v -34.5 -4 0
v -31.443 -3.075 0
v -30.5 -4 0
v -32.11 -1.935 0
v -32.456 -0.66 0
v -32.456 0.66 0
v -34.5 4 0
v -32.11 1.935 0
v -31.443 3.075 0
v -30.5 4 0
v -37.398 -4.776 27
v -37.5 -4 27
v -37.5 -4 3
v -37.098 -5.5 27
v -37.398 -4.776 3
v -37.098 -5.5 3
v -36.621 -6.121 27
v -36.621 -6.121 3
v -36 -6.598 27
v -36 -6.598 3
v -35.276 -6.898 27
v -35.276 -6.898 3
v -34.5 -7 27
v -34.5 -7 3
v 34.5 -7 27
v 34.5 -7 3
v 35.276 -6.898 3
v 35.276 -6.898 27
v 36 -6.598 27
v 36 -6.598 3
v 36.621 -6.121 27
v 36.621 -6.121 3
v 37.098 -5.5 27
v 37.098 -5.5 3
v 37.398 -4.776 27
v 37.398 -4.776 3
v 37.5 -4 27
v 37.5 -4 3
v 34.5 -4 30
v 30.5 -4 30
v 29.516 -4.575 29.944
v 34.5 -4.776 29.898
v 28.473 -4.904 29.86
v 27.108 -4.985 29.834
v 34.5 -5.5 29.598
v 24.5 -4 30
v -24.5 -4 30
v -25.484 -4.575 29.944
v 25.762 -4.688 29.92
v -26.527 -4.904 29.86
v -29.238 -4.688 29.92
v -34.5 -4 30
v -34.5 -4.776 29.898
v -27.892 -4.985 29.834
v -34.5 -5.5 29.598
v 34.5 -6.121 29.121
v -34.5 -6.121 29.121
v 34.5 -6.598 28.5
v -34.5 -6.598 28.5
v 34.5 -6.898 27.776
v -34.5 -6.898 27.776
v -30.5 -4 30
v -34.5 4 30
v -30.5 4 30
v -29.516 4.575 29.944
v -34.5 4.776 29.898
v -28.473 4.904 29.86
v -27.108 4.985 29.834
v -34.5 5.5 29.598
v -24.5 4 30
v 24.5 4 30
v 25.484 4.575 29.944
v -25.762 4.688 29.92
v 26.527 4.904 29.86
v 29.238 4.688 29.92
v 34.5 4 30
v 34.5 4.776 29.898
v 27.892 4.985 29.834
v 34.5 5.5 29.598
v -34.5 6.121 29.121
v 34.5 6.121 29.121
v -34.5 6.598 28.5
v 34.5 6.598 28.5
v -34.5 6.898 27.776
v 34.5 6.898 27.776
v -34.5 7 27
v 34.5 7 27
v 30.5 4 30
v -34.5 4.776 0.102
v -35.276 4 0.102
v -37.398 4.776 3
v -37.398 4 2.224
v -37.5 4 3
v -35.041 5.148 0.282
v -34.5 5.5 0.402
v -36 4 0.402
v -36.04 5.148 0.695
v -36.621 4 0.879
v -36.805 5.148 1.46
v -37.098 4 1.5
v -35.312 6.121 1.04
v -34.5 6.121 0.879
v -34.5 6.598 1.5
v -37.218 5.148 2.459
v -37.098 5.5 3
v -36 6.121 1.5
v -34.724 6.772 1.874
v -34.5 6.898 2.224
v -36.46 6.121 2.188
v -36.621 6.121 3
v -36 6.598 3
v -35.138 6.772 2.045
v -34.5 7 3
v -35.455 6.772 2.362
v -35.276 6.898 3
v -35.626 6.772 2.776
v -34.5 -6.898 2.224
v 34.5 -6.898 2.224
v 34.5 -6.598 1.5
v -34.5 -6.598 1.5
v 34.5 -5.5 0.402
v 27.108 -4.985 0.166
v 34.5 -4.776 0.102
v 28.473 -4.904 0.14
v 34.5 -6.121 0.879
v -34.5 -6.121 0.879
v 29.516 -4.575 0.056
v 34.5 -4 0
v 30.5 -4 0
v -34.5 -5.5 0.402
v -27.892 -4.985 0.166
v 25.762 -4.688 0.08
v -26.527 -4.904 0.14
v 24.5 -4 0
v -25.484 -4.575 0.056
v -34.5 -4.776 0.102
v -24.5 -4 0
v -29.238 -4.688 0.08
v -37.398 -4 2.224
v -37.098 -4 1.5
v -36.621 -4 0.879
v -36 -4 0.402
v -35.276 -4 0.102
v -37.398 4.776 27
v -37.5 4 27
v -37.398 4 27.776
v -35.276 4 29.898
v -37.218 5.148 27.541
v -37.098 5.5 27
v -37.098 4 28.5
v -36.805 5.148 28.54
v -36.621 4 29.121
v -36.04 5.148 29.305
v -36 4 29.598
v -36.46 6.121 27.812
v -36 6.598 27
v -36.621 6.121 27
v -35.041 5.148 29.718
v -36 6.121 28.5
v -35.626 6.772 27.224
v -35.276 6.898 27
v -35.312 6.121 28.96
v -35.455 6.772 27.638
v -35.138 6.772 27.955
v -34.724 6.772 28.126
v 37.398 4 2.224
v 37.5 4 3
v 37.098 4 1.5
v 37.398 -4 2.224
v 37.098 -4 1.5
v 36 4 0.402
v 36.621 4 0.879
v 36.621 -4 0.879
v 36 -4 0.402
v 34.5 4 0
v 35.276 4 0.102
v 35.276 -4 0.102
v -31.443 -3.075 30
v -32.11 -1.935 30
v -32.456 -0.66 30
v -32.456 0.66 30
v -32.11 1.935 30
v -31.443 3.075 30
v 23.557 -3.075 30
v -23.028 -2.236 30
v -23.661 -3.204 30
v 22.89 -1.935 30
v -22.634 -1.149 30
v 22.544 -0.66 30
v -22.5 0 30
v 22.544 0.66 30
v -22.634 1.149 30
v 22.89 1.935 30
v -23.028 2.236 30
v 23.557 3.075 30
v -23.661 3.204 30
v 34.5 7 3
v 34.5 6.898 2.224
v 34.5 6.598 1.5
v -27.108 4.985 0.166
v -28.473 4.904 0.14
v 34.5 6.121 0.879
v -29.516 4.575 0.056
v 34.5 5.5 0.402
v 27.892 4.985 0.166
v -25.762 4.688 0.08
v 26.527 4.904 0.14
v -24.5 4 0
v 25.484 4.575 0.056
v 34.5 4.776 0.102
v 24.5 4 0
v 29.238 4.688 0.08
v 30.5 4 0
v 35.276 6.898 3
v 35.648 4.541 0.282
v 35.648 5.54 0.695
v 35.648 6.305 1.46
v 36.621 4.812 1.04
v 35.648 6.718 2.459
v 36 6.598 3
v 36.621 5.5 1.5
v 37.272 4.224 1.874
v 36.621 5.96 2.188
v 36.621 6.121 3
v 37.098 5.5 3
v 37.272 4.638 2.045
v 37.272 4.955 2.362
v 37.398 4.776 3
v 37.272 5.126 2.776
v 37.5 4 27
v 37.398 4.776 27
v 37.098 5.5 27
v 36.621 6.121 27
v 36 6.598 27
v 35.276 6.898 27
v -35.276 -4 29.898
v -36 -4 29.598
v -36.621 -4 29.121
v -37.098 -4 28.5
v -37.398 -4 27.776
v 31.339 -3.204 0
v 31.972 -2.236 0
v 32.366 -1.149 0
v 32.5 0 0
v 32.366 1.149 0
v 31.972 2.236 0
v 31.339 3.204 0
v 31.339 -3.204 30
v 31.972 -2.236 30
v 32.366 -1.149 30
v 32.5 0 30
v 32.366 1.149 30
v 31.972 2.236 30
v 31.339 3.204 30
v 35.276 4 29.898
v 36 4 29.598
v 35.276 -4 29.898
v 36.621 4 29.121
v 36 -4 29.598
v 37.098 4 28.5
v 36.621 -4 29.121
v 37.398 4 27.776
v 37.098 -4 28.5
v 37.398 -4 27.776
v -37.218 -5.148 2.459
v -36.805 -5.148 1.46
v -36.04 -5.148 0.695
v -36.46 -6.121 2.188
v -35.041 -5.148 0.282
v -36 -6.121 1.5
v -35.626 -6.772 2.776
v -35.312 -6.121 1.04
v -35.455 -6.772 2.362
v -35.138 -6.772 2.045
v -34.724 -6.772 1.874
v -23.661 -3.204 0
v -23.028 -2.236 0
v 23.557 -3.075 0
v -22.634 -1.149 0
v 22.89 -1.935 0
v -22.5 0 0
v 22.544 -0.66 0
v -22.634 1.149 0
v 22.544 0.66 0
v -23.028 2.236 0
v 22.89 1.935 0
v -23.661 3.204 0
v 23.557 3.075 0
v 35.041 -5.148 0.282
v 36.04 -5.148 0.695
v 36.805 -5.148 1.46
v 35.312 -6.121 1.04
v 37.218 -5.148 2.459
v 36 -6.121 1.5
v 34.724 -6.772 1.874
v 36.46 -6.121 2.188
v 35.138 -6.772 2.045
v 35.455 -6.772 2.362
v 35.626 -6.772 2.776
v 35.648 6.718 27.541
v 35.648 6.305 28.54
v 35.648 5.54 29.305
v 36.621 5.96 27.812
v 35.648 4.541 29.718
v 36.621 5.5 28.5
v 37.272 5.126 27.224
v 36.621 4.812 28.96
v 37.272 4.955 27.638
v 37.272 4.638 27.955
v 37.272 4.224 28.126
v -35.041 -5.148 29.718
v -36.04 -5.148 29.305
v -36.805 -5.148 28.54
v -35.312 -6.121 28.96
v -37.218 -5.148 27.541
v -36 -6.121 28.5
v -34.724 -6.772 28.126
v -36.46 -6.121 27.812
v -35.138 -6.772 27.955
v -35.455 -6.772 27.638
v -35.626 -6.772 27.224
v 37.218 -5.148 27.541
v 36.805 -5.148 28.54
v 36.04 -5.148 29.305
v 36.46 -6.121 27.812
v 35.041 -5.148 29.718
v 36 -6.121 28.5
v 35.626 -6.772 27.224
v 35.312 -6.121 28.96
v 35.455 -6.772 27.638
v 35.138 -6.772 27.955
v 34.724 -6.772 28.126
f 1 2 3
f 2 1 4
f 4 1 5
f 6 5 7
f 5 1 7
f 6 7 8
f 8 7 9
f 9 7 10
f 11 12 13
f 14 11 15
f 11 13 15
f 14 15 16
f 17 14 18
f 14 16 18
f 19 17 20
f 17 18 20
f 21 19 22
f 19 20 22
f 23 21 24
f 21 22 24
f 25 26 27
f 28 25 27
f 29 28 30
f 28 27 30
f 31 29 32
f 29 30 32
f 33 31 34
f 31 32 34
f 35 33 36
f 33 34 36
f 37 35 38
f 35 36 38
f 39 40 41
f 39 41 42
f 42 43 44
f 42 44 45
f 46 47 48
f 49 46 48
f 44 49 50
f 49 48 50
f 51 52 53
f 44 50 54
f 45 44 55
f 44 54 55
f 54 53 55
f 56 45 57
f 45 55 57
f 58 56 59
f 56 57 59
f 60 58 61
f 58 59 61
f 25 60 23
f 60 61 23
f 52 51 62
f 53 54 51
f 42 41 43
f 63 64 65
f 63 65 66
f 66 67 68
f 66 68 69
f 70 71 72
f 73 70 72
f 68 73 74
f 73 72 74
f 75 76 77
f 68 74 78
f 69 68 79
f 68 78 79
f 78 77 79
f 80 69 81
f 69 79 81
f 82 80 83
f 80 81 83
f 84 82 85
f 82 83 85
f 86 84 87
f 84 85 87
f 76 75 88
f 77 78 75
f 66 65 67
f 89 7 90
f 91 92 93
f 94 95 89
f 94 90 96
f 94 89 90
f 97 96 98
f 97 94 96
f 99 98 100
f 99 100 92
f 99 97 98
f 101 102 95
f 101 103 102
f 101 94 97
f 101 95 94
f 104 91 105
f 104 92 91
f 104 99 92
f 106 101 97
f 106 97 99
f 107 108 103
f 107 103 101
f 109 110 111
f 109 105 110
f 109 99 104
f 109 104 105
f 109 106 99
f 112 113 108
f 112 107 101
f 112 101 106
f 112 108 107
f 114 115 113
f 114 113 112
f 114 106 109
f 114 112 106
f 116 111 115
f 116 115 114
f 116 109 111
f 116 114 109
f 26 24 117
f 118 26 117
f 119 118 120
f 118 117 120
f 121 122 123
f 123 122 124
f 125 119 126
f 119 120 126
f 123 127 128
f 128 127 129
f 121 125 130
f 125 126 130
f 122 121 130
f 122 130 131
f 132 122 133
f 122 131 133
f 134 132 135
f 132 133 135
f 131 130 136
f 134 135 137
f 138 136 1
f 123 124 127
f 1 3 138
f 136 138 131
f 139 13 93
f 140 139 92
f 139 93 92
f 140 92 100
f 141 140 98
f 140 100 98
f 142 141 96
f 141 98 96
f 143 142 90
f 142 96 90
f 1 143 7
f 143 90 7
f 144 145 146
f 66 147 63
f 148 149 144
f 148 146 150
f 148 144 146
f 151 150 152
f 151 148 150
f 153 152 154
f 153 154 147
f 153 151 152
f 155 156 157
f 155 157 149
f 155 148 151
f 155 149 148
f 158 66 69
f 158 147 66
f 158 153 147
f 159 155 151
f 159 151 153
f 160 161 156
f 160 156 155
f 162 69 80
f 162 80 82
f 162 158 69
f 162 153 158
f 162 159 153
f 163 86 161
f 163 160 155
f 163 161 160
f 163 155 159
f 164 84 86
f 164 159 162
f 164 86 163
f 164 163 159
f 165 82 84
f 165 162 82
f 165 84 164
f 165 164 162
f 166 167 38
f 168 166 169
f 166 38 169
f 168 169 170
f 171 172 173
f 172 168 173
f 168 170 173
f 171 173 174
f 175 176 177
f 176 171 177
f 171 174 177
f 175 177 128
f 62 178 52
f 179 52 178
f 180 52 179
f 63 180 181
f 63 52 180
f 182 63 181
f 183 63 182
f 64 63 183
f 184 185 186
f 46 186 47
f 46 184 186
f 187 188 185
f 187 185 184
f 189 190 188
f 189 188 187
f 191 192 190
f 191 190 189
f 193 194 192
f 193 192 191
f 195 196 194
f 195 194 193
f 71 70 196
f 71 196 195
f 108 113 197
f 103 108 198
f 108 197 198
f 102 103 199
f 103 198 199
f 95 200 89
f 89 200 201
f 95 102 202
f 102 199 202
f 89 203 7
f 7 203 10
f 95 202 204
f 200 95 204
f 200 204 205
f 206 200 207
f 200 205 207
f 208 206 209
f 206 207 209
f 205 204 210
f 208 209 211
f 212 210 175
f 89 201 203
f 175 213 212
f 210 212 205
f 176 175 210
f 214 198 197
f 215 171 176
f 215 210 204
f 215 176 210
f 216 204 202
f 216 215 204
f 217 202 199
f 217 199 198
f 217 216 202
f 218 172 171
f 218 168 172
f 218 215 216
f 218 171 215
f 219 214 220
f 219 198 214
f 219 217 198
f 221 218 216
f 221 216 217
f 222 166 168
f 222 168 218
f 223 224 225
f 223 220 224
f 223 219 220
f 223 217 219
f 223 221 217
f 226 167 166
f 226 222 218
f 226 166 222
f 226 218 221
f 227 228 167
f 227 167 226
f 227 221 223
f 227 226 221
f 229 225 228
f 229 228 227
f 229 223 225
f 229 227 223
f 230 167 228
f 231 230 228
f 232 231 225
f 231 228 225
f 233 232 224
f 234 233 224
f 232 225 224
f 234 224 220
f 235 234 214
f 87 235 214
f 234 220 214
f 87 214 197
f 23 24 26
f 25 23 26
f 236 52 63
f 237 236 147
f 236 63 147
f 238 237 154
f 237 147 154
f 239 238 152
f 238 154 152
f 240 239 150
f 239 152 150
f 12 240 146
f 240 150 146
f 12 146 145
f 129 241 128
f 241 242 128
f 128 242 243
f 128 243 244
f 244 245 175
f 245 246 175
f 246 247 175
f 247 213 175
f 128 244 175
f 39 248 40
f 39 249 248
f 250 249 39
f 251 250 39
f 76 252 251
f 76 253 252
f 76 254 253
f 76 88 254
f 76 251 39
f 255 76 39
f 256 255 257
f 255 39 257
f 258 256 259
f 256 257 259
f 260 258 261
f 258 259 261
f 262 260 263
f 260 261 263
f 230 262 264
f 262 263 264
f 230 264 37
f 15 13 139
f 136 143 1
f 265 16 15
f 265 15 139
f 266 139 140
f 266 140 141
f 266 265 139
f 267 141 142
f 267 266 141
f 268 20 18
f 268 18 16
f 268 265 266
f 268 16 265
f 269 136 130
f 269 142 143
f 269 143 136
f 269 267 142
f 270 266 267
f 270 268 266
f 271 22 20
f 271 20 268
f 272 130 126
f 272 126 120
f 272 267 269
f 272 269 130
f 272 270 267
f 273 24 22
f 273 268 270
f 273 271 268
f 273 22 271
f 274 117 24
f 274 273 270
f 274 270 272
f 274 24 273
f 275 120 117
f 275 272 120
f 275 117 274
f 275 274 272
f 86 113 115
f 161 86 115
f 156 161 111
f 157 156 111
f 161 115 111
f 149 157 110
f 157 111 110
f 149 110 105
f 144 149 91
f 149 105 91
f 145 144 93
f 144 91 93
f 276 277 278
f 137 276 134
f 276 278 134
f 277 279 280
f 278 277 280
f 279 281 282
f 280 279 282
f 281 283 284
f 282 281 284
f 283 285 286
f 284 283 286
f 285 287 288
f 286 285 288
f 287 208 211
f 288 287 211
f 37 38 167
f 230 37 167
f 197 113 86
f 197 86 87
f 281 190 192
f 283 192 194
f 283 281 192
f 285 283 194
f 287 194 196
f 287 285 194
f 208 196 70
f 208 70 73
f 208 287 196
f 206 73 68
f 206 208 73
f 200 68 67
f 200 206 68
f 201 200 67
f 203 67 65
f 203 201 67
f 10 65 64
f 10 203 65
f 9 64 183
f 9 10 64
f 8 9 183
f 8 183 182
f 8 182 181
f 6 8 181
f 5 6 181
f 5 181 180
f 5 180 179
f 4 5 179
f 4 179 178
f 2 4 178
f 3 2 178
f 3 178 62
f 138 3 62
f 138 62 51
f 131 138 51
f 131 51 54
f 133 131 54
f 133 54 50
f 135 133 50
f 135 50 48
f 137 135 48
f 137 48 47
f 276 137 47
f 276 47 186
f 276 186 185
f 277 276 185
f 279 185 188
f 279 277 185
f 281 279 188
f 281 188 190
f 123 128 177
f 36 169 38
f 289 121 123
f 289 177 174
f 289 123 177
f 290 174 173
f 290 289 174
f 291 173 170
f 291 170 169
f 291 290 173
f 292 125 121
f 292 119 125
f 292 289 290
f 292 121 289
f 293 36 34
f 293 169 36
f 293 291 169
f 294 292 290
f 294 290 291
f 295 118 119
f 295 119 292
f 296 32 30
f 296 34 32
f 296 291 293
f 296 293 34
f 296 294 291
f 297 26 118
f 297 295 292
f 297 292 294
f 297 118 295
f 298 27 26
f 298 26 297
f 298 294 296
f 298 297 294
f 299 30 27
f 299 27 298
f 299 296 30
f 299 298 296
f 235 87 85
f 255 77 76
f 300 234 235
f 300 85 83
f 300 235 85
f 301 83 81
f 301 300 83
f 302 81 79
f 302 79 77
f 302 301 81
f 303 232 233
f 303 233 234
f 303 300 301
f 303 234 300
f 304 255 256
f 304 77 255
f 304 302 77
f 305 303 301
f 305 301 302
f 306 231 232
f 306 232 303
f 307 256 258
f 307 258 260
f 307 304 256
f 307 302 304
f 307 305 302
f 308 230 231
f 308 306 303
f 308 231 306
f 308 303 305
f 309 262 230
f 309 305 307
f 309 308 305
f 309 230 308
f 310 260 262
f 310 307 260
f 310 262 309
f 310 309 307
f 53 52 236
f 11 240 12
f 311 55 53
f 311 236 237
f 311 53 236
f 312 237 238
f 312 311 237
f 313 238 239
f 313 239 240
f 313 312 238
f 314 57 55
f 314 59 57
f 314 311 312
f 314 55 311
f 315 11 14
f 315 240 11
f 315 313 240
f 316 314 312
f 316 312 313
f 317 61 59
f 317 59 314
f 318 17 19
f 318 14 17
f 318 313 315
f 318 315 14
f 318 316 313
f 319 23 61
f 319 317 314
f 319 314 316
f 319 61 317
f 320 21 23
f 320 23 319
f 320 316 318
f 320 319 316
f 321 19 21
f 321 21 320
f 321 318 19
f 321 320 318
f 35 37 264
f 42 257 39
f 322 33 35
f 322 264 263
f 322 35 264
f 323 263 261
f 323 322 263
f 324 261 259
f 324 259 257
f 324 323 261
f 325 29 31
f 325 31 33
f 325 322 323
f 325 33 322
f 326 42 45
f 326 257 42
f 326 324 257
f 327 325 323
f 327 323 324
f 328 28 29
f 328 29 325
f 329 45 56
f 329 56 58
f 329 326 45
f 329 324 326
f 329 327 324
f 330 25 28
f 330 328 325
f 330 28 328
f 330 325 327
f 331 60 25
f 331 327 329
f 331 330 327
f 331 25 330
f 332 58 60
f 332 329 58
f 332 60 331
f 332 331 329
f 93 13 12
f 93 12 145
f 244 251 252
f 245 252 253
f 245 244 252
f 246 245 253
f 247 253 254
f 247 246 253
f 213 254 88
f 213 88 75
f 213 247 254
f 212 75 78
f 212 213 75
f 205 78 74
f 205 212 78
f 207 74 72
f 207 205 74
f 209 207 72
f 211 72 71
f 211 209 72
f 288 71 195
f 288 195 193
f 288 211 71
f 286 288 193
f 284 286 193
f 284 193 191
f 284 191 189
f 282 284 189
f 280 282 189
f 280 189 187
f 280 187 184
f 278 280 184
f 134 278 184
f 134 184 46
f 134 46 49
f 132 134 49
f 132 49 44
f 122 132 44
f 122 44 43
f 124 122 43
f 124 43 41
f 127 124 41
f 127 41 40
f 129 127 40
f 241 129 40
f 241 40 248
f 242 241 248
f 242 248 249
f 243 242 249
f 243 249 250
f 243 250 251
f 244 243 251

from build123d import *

# Parameters (mm, degrees)
SKETCH1_W           = 75
SKETCH1_H           = 14
SKETCH1_R           = 5
BOSS_EXTRUDE1_DEPTH = 30
FILLET1_R           = 3


with BuildPart() as part:
    # Sketch1 → Boss-Extrude1 (new body)
    with BuildSketch(Plane.XY):
        Rectangle(SKETCH1_W, SKETCH1_H)
        with Locations((27.5, 0)):
            Circle(SKETCH1_R, mode=Mode.SUBTRACT)
        with Locations((-27.5, 0)):
            Circle(SKETCH1_R, mode=Mode.SUBTRACT)
    extrude(amount=BOSS_EXTRUDE1_DEPTH)

    # Fillet1
    # the kernel refuses this fillet: 3 mm, written as the material it takes off along each edge
    with BuildSketch(Plane(origin=(-34.5, 4, 27), x_dir=(-1, 0, 0), z_dir=(0, 1, 0))) as fillet1_piece_1_section:
        Polygon((0, 0), (FILLET1_R, 0), (FILLET1_R, FILLET1_R), (0, FILLET1_R), align=None)
    fillet1_piece_1 = extrude(amount=FILLET1_R, mode=Mode.PRIVATE)
    fillet1_piece_1 = fillet1_piece_1 - Plane(origin=(-34.5, 4, 27), x_dir=(0.7071067811865475, 0, -0.7071067811865475), z_dir=(0, 1, 0)) * Sphere(FILLET1_R, mode=Mode.PRIVATE)
    add(fillet1_piece_1, mode=Mode.SUBTRACT)
    with BuildSketch(Plane(origin=(-34.5, -4, 27), x_dir=(-1, 0, 0), z_dir=(0, -1, 0))) as fillet1_piece_2_section:
        Polygon((0, 0), (FILLET1_R, 0), (FILLET1_R, -FILLET1_R), (0, -FILLET1_R), align=None)
    fillet1_piece_2 = extrude(amount=FILLET1_R, mode=Mode.PRIVATE)
    fillet1_piece_2 = fillet1_piece_2 - Plane(origin=(-34.5, -4, 27), x_dir=(0.7071067811865475, 0, -0.7071067811865475), z_dir=(0, -1, 0)) * Sphere(FILLET1_R, mode=Mode.PRIVATE)
    add(fillet1_piece_2, mode=Mode.SUBTRACT)
    with BuildSketch(Plane(origin=(34.5, -4, 27), x_dir=(1, 0, 0), z_dir=(0, -1, 0))) as fillet1_piece_3_section:
        Polygon((0, 0), (FILLET1_R, 0), (FILLET1_R, FILLET1_R), (0, FILLET1_R), align=None)
    fillet1_piece_3 = extrude(amount=FILLET1_R, mode=Mode.PRIVATE)
    fillet1_piece_3 = fillet1_piece_3 - Plane(origin=(34.5, -4, 27), x_dir=(-0.7071067811865475, 0, -0.7071067811865475), z_dir=(0, -1, 0)) * Sphere(FILLET1_R, mode=Mode.PRIVATE)
    add(fillet1_piece_3, mode=Mode.SUBTRACT)
    with BuildSketch(Plane(origin=(34.5, 4, 27), x_dir=(0, 1, 0), z_dir=(1, 0, 0))) as fillet1_piece_4_section:
        Polygon((0, 0), (FILLET1_R, 0), (FILLET1_R, FILLET1_R), (0, FILLET1_R), align=None)
    fillet1_piece_4 = extrude(amount=FILLET1_R, mode=Mode.PRIVATE)
    fillet1_piece_4 = fillet1_piece_4 - Plane(origin=(34.5, 4, 27), x_dir=(0, -0.7071067811865475, -0.7071067811865475), z_dir=(1, 0, 0)) * Sphere(FILLET1_R, mode=Mode.PRIVATE)
    add(fillet1_piece_4, mode=Mode.SUBTRACT)
    with BuildSketch(Plane(origin=(-34.5, -4, 3), x_dir=(-1, 0, 0), z_dir=(0, -1, 0))) as fillet1_piece_5_section:
        Polygon((0, 0), (FILLET1_R, 0), (FILLET1_R, FILLET1_R), (0, FILLET1_R), align=None)
    fillet1_piece_5 = extrude(amount=FILLET1_R, mode=Mode.PRIVATE)
    fillet1_piece_5 = fillet1_piece_5 - Plane(origin=(-34.5, -4, 3), x_dir=(0.7071067811865475, 0, 0.7071067811865475), z_dir=(0, -1, 0)) * Sphere(FILLET1_R, mode=Mode.PRIVATE)
    add(fillet1_piece_5, mode=Mode.SUBTRACT)
    with BuildSketch(Plane(origin=(34.5, -4, 3), x_dir=(1, 0, 0), z_dir=(0, -1, 0))) as fillet1_piece_6_section:
        Polygon((0, 0), (FILLET1_R, 0), (FILLET1_R, -FILLET1_R), (0, -FILLET1_R), align=None)
    fillet1_piece_6 = extrude(amount=FILLET1_R, mode=Mode.PRIVATE)
    fillet1_piece_6 = fillet1_piece_6 - Plane(origin=(34.5, -4, 3), x_dir=(-0.7071067811865475, 0, 0.7071067811865475), z_dir=(0, -1, 0)) * Sphere(FILLET1_R, mode=Mode.PRIVATE)
    add(fillet1_piece_6, mode=Mode.SUBTRACT)
    with BuildSketch(Plane(origin=(-34.5, 4, 3), x_dir=(-1, 0, 0), z_dir=(0, 1, 0))) as fillet1_piece_7_section:
        Polygon((0, 0), (FILLET1_R, 0), (FILLET1_R, -FILLET1_R), (0, -FILLET1_R), align=None)
    fillet1_piece_7 = extrude(amount=FILLET1_R, mode=Mode.PRIVATE)
    fillet1_piece_7 = fillet1_piece_7 - Plane(origin=(-34.5, 4, 3), x_dir=(0.7071067811865475, 0, 0.7071067811865475), z_dir=(0, 1, 0)) * Sphere(FILLET1_R, mode=Mode.PRIVATE)
    add(fillet1_piece_7, mode=Mode.SUBTRACT)
    with BuildSketch(Plane(origin=(34.5, 4, 3), x_dir=(0, 1, 0), z_dir=(1, 0, 0))) as fillet1_piece_8_section:
        Polygon((0, 0), (FILLET1_R, 0), (FILLET1_R, -FILLET1_R), (0, -FILLET1_R), align=None)
    fillet1_piece_8 = extrude(amount=FILLET1_R, mode=Mode.PRIVATE)
    fillet1_piece_8 = fillet1_piece_8 - Plane(origin=(34.5, 4, 3), x_dir=(0, -0.7071067811865475, 0.7071067811865475), z_dir=(1, 0, 0)) * Sphere(FILLET1_R, mode=Mode.PRIVATE)
    add(fillet1_piece_8, mode=Mode.SUBTRACT)
    with BuildSketch(Plane(origin=(-37.5, 4, 30), x_dir=(0, 0, -1), z_dir=(0, -1, 0)), Plane(origin=(37.5, -4, 30), x_dir=(0, 0, -1), z_dir=(0, 1, 0))) as fillet1_piece_9:
        with BuildLine():
            CenterArc((FILLET1_R, FILLET1_R), FILLET1_R, 180, 90)
            Line((0, FILLET1_R), (0, 0))
            Line((0, 0), (FILLET1_R, 0))
        make_face()
    extrude(amount=8, mode=Mode.SUBTRACT)
    with BuildSketch(Plane(origin=(-34.5, -7, 30), x_dir=(0, 0, -1), z_dir=(1, 0, 0)), Plane(origin=(34.5, 7, 30), x_dir=(0, 0, -1), z_dir=(-1, 0, 0))) as fillet1_piece_10:
        with BuildLine():
            CenterArc((FILLET1_R, FILLET1_R), FILLET1_R, 180, 90)
            Line((0, FILLET1_R), (0, 0))
            Line((0, 0), (FILLET1_R, 0))
        make_face()
    extrude(amount=69, mode=Mode.SUBTRACT)
    with BuildSketch(Plane(origin=(-34.5, -7, 0), x_dir=(0, 0, 1), z_dir=(1, 0, 0)), Plane(origin=(34.5, 7, 0), x_dir=(0, 0, 1), z_dir=(-1, 0, 0))) as fillet1_piece_11:
        with BuildLine():
            CenterArc((FILLET1_R, -FILLET1_R), FILLET1_R, 90, 90)
            Line((0, -FILLET1_R), (0, 0))
            Line((0, 0), (FILLET1_R, 0))
        make_face()
    extrude(amount=69, mode=Mode.SUBTRACT)
    with BuildSketch(Plane(origin=(-37.5, 4, 0), x_dir=(0, 0, 1), z_dir=(0, -1, 0)), Plane(origin=(37.5, -4, 0), x_dir=(0, 0, 1), z_dir=(0, 1, 0))) as fillet1_piece_12:
        with BuildLine():
            CenterArc((FILLET1_R, -FILLET1_R), FILLET1_R, 90, 90)
            Line((0, -FILLET1_R), (0, 0))
            Line((0, 0), (FILLET1_R, 0))
        make_face()
    extrude(amount=8, mode=Mode.SUBTRACT)
    with BuildSketch(Plane(origin=(37.5, -7, 3), x_dir=(-1, 0, 0), z_dir=(0, 0, 1)), Plane(origin=(-37.5, 7, 3), x_dir=(1, 0, 0), z_dir=(0, 0, 1)), Plane(origin=(37.5, 7, 3), x_dir=(0, -1, 0), z_dir=(0, 0, 1))) as fillet1_piece_13:
        with BuildLine():
            CenterArc((FILLET1_R, -FILLET1_R), FILLET1_R, 90, 90)
            Line((0, -FILLET1_R), (0, 0))
            Line((0, 0), (FILLET1_R, 0))
        make_face()
    extrude(amount=24, mode=Mode.SUBTRACT)
    with BuildSketch(Plane(origin=(-37.5, -7, 3), x_dir=(1, 0, 0), z_dir=(0, 0, 1))) as fillet1_piece_14:
        with BuildLine():
            CenterArc((FILLET1_R, FILLET1_R), FILLET1_R, 180, 90)
            Line((0, FILLET1_R), (0, 0))
            Line((0, 0), (FILLET1_R, 0))
        make_face()
    extrude(amount=24, mode=Mode.SUBTRACT)


solid = part.part
